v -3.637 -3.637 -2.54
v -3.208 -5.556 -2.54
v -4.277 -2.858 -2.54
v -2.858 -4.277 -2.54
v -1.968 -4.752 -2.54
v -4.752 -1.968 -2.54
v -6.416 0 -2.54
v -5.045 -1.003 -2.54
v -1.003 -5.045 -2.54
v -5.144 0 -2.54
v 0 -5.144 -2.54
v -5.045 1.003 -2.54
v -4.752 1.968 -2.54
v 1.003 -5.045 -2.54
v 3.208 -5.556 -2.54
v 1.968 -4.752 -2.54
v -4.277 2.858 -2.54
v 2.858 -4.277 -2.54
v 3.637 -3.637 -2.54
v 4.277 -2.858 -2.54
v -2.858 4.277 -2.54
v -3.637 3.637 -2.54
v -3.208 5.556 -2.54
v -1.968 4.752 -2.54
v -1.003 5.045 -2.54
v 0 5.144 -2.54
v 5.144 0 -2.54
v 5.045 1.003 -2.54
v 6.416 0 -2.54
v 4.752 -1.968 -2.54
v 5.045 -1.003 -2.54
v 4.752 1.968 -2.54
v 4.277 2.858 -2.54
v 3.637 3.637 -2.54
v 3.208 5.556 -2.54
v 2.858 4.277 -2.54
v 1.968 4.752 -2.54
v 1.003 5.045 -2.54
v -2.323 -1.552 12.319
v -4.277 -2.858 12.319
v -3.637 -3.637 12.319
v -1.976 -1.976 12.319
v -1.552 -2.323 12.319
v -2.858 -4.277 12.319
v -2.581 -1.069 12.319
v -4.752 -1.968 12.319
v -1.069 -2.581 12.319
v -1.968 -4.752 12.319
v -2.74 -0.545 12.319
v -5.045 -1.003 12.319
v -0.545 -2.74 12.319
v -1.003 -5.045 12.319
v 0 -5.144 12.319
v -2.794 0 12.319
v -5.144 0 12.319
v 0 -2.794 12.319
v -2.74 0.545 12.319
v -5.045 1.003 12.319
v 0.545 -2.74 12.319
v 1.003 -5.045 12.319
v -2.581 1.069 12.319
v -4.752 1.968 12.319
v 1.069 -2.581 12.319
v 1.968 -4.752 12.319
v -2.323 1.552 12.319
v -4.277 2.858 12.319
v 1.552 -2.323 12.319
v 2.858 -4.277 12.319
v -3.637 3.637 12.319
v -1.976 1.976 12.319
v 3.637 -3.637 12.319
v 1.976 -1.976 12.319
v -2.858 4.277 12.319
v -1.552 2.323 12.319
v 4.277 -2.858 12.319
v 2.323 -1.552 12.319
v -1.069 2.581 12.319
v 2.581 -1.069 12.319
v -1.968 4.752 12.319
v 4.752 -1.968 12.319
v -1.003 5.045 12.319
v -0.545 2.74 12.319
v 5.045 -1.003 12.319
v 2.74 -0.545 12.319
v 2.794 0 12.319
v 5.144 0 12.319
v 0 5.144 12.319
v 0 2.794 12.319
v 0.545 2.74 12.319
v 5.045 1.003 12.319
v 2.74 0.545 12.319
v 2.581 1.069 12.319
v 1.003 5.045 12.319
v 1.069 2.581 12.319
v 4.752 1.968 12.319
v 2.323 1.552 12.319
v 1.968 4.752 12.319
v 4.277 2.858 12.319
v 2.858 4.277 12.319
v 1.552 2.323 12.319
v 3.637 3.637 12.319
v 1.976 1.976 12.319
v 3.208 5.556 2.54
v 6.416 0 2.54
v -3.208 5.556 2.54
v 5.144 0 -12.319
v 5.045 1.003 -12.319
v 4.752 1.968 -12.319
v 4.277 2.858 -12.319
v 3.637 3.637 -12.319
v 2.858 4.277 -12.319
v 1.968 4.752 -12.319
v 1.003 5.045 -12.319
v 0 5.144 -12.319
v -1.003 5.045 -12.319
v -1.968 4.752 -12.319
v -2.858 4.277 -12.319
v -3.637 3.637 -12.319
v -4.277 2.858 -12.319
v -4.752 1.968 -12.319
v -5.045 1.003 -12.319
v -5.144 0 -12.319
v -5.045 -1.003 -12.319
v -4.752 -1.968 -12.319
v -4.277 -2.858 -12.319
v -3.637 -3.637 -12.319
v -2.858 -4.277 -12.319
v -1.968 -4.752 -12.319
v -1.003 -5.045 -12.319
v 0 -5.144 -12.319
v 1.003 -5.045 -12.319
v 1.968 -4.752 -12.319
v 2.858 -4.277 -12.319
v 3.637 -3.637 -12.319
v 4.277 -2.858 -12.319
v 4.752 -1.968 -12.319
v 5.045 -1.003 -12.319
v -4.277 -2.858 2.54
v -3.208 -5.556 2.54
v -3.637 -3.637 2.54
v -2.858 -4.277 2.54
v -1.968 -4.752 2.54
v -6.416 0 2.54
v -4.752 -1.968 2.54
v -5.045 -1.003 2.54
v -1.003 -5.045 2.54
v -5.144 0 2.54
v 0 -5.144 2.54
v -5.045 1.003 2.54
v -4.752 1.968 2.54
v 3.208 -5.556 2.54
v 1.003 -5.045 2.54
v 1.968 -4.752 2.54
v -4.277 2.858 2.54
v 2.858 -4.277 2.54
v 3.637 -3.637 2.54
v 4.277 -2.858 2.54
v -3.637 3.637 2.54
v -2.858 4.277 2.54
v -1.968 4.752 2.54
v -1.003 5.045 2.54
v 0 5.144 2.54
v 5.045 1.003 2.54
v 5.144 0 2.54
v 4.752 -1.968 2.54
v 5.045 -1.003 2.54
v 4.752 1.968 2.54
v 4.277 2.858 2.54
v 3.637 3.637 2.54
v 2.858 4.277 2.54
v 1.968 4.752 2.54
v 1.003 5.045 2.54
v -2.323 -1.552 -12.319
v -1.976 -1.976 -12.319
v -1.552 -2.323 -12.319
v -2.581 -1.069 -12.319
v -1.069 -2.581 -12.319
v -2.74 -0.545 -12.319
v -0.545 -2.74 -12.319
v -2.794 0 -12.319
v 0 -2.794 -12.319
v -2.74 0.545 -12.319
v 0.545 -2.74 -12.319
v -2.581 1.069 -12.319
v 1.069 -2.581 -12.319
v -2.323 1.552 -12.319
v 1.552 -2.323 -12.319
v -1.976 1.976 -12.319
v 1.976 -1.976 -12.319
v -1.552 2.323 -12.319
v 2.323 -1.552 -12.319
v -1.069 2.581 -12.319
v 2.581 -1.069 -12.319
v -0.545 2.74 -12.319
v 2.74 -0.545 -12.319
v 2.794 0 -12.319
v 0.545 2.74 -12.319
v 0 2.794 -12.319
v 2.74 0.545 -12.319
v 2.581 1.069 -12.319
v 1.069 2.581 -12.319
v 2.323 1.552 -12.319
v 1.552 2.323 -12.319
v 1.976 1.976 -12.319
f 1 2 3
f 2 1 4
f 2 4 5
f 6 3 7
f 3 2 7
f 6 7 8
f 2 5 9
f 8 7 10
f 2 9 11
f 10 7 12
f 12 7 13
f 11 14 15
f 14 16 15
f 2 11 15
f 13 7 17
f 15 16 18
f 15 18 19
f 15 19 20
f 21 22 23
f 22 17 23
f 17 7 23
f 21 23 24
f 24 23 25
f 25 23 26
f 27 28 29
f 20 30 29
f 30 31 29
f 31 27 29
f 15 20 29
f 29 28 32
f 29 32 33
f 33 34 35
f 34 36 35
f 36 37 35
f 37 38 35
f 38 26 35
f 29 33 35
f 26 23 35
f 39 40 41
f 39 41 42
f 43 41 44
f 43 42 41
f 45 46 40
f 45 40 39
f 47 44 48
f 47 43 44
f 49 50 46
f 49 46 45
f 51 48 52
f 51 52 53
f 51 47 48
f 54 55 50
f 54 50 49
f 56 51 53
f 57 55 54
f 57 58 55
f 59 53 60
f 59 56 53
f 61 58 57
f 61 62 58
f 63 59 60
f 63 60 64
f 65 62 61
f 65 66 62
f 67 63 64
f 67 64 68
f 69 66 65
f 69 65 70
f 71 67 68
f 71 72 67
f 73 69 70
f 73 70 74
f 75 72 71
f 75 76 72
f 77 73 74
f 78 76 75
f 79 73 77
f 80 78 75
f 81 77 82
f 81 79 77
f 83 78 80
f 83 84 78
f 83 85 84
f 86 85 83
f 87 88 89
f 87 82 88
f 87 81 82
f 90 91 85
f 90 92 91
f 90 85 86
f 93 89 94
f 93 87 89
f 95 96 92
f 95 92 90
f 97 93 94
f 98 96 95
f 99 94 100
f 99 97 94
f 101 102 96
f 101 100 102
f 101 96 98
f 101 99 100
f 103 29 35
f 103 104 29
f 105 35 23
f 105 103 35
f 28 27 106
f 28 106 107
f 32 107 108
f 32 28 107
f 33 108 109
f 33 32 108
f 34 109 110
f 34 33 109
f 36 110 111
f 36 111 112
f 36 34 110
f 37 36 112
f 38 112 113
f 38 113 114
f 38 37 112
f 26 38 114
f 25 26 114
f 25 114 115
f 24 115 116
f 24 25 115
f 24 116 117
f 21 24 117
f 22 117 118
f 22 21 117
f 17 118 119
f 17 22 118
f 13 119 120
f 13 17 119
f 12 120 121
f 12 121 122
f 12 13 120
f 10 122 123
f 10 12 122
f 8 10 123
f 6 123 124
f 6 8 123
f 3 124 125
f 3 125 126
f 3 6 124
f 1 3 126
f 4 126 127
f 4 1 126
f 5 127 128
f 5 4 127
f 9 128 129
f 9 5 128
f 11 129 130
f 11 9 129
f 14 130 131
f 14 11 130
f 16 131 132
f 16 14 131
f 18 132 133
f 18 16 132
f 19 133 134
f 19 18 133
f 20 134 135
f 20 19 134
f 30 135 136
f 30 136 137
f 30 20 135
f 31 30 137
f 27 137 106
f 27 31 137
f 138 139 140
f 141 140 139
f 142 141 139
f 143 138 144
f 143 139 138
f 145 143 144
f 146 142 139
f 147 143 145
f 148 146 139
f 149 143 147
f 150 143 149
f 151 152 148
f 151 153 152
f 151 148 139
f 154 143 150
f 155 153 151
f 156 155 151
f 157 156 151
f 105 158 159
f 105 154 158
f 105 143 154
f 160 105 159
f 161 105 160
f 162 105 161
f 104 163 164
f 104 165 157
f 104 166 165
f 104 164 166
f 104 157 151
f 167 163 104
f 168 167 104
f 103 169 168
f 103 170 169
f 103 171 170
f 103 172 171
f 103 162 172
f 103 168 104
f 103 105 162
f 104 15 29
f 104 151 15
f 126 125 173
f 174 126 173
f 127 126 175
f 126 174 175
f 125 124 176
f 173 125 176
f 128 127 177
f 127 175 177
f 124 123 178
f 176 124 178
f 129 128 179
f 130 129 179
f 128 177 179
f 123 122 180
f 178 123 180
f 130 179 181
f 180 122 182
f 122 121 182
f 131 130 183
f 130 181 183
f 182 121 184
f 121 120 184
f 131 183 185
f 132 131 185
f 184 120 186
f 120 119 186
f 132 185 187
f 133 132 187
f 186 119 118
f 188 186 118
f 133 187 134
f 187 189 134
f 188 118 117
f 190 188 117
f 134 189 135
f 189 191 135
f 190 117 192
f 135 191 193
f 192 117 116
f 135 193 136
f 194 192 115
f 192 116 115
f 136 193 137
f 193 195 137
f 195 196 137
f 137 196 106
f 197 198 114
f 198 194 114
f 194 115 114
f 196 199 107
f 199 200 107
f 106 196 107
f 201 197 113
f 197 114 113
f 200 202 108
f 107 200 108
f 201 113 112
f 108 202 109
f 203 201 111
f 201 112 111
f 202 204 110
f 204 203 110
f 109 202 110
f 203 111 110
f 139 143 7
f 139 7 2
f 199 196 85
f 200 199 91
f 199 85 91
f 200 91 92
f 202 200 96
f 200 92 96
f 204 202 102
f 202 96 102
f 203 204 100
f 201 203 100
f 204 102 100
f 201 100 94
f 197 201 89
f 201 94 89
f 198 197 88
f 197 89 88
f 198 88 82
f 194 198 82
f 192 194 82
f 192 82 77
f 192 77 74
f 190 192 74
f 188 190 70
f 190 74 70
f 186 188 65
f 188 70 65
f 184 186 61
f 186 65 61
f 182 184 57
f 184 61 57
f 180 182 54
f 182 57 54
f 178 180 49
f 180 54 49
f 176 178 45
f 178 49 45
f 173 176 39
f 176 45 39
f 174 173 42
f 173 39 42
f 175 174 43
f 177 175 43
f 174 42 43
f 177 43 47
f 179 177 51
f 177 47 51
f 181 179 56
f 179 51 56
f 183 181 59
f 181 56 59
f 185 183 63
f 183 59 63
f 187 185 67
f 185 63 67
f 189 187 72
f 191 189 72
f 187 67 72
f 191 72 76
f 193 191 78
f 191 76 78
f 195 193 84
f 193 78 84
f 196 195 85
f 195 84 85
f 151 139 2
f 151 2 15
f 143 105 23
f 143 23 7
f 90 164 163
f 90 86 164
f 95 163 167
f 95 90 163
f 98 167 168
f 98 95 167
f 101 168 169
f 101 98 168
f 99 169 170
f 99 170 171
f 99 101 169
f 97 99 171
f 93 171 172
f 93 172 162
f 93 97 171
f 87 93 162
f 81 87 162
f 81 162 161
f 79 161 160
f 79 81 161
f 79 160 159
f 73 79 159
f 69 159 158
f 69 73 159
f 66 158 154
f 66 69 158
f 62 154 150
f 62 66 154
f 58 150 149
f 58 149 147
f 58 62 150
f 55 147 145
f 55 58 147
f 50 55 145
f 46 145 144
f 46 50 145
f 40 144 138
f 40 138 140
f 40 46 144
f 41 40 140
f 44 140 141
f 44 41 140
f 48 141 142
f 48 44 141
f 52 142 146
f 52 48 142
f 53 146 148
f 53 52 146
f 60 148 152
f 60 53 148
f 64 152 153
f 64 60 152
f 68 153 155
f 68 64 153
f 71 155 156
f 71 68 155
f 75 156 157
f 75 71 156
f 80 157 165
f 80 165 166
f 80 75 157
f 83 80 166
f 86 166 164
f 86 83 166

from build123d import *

# Parameters (mm, degrees)
SKETCH2_R           = 5.1435
BOSS_EXTRUDE1_DEPTH = 12.319
SKETCH3_R           = 2.794
CUT_EXTRUDE1_DEPTH  = 25.638
BOSS_EXTRUDE2_DEPTH = 2.54
SKETCH3_2_R         = 2.794
CUT_EXTRUDE2_DEPTH  = 25.638


with BuildPart() as part:
    # Sketch2 → Boss-Extrude1 (new body, symmetric)
    with BuildSketch(Plane.XY):
        Circle(SKETCH2_R)
    extrude(amount=BOSS_EXTRUDE1_DEPTH, both=True)

    # Sketch3 → Cut-Extrude1 (cut, through all)
    with BuildSketch(Plane.XY.offset(12.319)):
        Circle(SKETCH3_R)
    extrude(amount=-CUT_EXTRUDE1_DEPTH, mode=Mode.SUBTRACT)

    # Sketch4 → Boss-Extrude2 (add, symmetric)
    with BuildSketch(Plane.XY):
        Polygon((3.207902433, 5.55625), (-3.207902433, 5.55625), (-6.415804866, 0), (-3.207902433, -5.55625), (3.207902433, -5.55625), (6.415804866, 0), align=None)
    extrude(amount=BOSS_EXTRUDE2_DEPTH, both=True)

    # Sketch3<2> → Cut-Extrude2 (cut, through all)
    with BuildSketch(Plane.XY.offset(12.319)):
        Circle(SKETCH3_2_R)
    extrude(amount=-CUT_EXTRUDE2_DEPTH, mode=Mode.SUBTRACT)


solid = part.part
